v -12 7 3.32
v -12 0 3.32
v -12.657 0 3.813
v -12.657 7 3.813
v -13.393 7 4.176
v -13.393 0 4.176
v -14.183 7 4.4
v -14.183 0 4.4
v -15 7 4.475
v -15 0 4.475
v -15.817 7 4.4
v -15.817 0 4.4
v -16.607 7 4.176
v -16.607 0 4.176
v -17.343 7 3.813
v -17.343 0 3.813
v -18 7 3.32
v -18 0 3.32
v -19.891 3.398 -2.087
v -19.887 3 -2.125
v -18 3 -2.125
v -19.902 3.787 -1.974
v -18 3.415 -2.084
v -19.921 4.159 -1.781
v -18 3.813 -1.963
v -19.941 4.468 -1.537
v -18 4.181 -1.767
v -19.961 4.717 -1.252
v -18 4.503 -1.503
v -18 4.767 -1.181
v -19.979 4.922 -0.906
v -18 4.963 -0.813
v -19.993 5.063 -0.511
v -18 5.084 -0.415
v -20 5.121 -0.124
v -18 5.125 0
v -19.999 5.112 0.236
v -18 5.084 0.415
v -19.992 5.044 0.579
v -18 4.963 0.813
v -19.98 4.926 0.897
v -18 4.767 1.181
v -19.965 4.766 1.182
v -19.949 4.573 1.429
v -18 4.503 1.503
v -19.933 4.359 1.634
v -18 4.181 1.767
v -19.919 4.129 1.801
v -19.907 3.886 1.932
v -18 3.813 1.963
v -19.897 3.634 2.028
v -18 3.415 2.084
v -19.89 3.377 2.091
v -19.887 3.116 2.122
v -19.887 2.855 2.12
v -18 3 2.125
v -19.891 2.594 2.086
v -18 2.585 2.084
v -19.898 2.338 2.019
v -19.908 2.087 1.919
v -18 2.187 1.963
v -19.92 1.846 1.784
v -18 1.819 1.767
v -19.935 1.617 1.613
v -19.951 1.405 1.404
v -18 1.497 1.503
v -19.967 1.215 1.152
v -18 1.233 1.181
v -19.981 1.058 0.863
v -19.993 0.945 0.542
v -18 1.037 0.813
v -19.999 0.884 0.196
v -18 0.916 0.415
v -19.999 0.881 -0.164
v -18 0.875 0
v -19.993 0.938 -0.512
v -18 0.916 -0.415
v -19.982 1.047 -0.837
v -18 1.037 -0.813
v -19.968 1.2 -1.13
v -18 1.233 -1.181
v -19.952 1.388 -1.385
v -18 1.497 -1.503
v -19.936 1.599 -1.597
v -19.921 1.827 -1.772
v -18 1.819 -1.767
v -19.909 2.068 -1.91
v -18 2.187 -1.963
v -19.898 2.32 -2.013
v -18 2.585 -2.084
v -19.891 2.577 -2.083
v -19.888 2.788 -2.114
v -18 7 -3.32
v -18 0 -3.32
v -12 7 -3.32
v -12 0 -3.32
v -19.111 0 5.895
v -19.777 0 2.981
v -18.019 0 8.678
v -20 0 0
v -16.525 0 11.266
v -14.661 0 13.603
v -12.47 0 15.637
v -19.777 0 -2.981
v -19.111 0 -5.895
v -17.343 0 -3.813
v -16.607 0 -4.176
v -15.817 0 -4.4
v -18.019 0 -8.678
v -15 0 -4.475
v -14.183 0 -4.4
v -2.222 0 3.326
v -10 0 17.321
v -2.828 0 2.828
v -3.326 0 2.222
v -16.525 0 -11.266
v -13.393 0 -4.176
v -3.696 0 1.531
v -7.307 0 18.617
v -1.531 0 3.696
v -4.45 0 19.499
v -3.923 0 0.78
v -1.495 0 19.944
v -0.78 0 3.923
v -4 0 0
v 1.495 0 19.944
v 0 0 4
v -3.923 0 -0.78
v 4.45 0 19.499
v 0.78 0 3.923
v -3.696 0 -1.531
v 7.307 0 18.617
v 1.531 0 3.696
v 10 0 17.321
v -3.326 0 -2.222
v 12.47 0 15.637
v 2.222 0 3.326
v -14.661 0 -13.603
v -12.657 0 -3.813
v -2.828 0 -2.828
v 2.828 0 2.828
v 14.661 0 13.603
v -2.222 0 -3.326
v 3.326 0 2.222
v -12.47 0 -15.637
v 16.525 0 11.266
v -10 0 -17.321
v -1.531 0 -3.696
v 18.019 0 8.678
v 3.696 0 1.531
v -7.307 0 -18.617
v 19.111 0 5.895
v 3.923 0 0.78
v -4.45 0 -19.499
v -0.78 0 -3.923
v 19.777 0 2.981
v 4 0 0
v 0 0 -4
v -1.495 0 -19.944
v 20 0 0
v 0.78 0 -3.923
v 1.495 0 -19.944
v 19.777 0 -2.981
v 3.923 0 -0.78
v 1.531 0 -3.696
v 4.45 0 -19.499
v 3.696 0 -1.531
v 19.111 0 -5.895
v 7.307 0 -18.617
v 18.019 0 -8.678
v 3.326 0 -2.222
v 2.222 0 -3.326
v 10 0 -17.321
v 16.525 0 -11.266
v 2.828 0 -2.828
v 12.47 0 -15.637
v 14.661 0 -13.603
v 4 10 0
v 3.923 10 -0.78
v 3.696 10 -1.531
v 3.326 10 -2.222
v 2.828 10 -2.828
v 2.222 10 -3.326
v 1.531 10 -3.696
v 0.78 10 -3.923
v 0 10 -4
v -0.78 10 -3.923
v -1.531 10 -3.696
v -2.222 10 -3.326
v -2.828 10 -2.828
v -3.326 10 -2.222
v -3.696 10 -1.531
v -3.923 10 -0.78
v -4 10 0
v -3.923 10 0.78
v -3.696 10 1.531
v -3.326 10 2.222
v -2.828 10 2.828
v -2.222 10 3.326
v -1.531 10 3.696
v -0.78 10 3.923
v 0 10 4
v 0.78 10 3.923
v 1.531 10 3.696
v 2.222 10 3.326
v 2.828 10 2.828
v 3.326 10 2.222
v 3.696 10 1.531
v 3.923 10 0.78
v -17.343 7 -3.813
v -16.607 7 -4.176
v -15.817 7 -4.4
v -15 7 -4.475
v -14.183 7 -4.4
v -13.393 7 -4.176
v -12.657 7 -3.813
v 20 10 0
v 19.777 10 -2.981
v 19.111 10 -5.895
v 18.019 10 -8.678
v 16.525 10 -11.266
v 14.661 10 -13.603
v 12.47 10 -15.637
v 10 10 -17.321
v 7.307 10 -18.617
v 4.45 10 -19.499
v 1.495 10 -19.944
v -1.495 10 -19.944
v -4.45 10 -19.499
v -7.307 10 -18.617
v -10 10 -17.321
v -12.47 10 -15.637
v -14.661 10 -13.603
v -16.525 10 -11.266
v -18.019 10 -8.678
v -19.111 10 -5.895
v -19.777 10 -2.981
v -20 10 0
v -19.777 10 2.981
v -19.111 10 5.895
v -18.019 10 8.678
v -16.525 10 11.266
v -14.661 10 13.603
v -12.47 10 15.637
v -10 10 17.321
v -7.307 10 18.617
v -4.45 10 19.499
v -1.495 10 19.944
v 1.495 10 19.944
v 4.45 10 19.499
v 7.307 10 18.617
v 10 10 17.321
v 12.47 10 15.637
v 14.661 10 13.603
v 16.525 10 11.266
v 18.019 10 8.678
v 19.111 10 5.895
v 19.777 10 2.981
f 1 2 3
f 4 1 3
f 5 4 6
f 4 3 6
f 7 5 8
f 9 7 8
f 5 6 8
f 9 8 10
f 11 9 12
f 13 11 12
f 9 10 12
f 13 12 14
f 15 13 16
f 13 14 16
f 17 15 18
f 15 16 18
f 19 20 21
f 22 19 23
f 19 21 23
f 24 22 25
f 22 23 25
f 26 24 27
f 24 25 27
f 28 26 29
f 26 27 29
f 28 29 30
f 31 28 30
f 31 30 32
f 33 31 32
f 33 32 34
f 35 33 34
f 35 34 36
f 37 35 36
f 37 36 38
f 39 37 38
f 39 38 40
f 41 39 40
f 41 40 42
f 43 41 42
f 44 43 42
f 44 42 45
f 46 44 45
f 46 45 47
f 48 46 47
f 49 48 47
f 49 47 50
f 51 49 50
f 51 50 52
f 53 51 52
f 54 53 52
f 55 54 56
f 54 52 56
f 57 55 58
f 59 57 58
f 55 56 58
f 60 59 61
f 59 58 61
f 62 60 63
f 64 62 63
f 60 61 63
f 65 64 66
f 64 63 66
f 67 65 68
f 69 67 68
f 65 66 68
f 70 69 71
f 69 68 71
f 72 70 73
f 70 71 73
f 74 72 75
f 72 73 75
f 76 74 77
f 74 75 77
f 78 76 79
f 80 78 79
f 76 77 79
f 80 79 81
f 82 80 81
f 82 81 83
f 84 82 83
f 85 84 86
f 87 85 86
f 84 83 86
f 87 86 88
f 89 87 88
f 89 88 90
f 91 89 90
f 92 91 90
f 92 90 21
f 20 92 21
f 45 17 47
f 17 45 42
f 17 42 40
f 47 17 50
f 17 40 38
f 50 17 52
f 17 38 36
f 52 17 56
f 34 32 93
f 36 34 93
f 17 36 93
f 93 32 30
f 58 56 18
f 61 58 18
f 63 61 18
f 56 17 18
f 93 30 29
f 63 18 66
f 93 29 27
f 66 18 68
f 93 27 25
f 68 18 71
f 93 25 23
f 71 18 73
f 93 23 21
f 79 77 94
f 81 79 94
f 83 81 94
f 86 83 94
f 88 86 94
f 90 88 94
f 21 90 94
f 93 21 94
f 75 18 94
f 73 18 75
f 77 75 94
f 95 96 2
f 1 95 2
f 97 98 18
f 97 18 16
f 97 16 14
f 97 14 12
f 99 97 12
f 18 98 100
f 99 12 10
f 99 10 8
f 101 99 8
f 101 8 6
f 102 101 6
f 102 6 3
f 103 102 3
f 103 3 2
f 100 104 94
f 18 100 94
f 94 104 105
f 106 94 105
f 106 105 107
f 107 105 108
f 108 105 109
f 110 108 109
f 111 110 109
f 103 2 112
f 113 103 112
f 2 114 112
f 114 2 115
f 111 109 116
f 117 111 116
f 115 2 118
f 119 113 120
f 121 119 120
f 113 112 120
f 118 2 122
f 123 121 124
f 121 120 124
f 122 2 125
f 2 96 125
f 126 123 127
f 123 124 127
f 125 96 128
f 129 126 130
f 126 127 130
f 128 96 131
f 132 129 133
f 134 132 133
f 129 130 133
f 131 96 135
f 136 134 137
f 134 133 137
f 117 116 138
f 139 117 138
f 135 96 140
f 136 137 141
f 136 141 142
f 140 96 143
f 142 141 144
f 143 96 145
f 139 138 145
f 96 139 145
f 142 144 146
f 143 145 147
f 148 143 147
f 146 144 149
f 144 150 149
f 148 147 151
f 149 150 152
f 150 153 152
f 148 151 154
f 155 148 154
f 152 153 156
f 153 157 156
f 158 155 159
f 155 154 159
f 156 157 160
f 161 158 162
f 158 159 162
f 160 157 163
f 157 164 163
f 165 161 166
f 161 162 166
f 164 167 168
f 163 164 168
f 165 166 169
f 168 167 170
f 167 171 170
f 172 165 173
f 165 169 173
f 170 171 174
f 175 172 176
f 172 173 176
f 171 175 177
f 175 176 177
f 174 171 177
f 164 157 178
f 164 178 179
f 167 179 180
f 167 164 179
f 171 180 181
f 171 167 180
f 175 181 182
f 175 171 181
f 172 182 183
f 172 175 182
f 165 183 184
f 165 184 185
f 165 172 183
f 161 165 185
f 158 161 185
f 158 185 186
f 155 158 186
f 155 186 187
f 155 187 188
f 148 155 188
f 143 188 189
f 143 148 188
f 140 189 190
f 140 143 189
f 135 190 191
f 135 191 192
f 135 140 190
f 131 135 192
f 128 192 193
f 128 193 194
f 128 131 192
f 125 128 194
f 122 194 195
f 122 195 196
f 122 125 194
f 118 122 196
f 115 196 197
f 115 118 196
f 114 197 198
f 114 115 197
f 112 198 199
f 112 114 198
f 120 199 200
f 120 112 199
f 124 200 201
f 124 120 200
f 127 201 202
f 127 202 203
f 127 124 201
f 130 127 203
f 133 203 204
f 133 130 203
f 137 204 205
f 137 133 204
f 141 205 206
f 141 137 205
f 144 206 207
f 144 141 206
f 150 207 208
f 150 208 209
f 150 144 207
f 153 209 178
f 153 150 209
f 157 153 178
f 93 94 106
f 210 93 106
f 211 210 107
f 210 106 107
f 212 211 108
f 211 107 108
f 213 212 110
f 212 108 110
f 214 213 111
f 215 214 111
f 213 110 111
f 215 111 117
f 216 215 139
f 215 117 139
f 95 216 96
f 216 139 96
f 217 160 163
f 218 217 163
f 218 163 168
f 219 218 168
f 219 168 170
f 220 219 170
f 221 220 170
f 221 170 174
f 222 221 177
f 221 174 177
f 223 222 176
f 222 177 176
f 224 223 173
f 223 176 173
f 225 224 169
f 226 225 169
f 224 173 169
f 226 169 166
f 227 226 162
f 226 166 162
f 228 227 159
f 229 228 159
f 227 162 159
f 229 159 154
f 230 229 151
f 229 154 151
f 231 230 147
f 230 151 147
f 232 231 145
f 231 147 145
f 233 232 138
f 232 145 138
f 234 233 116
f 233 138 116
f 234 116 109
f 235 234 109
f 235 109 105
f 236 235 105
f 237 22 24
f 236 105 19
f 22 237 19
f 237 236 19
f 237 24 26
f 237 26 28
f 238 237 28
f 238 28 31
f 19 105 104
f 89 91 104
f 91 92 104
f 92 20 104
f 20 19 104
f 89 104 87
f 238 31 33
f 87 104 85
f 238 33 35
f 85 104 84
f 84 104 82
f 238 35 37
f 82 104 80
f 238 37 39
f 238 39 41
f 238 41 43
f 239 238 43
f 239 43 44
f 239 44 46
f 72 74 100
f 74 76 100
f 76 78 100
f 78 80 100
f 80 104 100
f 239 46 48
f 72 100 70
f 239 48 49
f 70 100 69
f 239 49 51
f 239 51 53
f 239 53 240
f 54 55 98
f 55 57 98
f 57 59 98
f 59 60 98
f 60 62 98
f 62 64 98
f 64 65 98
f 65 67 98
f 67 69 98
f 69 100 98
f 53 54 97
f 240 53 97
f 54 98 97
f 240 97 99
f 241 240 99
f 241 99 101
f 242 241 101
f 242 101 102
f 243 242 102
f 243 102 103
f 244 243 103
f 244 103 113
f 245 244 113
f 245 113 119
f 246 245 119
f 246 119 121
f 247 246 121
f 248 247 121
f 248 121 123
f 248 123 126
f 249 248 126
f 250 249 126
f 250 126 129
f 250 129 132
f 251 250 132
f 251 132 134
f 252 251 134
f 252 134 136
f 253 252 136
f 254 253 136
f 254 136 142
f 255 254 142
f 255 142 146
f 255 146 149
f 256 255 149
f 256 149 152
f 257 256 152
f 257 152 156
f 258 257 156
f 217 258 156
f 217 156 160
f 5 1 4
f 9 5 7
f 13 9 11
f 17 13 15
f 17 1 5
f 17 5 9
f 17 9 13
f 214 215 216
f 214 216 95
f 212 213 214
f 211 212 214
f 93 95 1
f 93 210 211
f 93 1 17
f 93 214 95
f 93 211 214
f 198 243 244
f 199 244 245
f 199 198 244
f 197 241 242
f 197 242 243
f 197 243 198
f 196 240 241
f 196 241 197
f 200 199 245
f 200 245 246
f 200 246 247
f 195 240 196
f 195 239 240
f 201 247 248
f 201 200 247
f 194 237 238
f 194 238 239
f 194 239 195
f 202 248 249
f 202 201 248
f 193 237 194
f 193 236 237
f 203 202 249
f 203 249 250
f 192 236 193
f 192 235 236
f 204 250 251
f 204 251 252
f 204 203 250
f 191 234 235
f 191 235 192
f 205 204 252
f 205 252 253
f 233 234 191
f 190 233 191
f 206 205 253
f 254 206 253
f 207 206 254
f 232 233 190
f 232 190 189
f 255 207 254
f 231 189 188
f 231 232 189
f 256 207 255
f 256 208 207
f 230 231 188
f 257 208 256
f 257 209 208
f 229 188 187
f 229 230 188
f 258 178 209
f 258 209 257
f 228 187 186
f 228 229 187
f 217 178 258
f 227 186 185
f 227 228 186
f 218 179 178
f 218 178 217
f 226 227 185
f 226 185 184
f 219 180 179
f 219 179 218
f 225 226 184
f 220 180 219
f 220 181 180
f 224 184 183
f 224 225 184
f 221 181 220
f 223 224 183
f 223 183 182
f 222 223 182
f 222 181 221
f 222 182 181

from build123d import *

# Parameters (mm, degrees)
SKETCH1_R           = 20
SKETCH1_R_2         = 4
BOSS_EXTRUDE1_DEPTH = 10
CUT_EXTRUDE1_DEPTH  = 7
SKETCH4_R           = 2.125
CUT_EXTRUDE2_DEPTH  = 3.000006


with BuildPart() as part:
    # Sketch1 → Boss-Extrude1 (new body)
    with BuildSketch(Plane(origin=(0, 0, 0), x_dir=(1, 0, 0), z_dir=(0, 1, 0))):
        Circle(SKETCH1_R)
        Circle(SKETCH1_R_2, mode=Mode.SUBTRACT)
    extrude(amount=BOSS_EXTRUDE1_DEPTH)

    # Sketch3 → Cut-Extrude1 (cut)
    with BuildSketch(Plane(origin=(0, 0, 0), x_dir=(1, 0, 0), z_dir=(0, 1, 0))):
        with BuildLine():
            Line((-12.000006, 3.320491078), (-12.000006, -3.320491078))
            ThreePointArc((-12.000006, -3.320491078), (-15, -4.475), (-17.999994, -3.320491078))
            Line((-17.999994, -3.320491078), (-17.999994, 3.320491078))
            ThreePointArc((-17.999994, 3.320491078), (-15, 4.475), (-12.000006, 3.320491078))
        make_face()
    extrude(amount=CUT_EXTRUDE1_DEPTH, mode=Mode.SUBTRACT)

    # Sketch4 → Cut-Extrude2 (cut, through all)
    with BuildSketch(Plane(origin=(-17.999994, 0, 0), x_dir=(0, 0, -1), z_dir=(1, 0, 0))):
        with Locations((0, 3)):
            Circle(SKETCH4_R)
    extrude(amount=-CUT_EXTRUDE2_DEPTH, mode=Mode.SUBTRACT)


solid = part.part
